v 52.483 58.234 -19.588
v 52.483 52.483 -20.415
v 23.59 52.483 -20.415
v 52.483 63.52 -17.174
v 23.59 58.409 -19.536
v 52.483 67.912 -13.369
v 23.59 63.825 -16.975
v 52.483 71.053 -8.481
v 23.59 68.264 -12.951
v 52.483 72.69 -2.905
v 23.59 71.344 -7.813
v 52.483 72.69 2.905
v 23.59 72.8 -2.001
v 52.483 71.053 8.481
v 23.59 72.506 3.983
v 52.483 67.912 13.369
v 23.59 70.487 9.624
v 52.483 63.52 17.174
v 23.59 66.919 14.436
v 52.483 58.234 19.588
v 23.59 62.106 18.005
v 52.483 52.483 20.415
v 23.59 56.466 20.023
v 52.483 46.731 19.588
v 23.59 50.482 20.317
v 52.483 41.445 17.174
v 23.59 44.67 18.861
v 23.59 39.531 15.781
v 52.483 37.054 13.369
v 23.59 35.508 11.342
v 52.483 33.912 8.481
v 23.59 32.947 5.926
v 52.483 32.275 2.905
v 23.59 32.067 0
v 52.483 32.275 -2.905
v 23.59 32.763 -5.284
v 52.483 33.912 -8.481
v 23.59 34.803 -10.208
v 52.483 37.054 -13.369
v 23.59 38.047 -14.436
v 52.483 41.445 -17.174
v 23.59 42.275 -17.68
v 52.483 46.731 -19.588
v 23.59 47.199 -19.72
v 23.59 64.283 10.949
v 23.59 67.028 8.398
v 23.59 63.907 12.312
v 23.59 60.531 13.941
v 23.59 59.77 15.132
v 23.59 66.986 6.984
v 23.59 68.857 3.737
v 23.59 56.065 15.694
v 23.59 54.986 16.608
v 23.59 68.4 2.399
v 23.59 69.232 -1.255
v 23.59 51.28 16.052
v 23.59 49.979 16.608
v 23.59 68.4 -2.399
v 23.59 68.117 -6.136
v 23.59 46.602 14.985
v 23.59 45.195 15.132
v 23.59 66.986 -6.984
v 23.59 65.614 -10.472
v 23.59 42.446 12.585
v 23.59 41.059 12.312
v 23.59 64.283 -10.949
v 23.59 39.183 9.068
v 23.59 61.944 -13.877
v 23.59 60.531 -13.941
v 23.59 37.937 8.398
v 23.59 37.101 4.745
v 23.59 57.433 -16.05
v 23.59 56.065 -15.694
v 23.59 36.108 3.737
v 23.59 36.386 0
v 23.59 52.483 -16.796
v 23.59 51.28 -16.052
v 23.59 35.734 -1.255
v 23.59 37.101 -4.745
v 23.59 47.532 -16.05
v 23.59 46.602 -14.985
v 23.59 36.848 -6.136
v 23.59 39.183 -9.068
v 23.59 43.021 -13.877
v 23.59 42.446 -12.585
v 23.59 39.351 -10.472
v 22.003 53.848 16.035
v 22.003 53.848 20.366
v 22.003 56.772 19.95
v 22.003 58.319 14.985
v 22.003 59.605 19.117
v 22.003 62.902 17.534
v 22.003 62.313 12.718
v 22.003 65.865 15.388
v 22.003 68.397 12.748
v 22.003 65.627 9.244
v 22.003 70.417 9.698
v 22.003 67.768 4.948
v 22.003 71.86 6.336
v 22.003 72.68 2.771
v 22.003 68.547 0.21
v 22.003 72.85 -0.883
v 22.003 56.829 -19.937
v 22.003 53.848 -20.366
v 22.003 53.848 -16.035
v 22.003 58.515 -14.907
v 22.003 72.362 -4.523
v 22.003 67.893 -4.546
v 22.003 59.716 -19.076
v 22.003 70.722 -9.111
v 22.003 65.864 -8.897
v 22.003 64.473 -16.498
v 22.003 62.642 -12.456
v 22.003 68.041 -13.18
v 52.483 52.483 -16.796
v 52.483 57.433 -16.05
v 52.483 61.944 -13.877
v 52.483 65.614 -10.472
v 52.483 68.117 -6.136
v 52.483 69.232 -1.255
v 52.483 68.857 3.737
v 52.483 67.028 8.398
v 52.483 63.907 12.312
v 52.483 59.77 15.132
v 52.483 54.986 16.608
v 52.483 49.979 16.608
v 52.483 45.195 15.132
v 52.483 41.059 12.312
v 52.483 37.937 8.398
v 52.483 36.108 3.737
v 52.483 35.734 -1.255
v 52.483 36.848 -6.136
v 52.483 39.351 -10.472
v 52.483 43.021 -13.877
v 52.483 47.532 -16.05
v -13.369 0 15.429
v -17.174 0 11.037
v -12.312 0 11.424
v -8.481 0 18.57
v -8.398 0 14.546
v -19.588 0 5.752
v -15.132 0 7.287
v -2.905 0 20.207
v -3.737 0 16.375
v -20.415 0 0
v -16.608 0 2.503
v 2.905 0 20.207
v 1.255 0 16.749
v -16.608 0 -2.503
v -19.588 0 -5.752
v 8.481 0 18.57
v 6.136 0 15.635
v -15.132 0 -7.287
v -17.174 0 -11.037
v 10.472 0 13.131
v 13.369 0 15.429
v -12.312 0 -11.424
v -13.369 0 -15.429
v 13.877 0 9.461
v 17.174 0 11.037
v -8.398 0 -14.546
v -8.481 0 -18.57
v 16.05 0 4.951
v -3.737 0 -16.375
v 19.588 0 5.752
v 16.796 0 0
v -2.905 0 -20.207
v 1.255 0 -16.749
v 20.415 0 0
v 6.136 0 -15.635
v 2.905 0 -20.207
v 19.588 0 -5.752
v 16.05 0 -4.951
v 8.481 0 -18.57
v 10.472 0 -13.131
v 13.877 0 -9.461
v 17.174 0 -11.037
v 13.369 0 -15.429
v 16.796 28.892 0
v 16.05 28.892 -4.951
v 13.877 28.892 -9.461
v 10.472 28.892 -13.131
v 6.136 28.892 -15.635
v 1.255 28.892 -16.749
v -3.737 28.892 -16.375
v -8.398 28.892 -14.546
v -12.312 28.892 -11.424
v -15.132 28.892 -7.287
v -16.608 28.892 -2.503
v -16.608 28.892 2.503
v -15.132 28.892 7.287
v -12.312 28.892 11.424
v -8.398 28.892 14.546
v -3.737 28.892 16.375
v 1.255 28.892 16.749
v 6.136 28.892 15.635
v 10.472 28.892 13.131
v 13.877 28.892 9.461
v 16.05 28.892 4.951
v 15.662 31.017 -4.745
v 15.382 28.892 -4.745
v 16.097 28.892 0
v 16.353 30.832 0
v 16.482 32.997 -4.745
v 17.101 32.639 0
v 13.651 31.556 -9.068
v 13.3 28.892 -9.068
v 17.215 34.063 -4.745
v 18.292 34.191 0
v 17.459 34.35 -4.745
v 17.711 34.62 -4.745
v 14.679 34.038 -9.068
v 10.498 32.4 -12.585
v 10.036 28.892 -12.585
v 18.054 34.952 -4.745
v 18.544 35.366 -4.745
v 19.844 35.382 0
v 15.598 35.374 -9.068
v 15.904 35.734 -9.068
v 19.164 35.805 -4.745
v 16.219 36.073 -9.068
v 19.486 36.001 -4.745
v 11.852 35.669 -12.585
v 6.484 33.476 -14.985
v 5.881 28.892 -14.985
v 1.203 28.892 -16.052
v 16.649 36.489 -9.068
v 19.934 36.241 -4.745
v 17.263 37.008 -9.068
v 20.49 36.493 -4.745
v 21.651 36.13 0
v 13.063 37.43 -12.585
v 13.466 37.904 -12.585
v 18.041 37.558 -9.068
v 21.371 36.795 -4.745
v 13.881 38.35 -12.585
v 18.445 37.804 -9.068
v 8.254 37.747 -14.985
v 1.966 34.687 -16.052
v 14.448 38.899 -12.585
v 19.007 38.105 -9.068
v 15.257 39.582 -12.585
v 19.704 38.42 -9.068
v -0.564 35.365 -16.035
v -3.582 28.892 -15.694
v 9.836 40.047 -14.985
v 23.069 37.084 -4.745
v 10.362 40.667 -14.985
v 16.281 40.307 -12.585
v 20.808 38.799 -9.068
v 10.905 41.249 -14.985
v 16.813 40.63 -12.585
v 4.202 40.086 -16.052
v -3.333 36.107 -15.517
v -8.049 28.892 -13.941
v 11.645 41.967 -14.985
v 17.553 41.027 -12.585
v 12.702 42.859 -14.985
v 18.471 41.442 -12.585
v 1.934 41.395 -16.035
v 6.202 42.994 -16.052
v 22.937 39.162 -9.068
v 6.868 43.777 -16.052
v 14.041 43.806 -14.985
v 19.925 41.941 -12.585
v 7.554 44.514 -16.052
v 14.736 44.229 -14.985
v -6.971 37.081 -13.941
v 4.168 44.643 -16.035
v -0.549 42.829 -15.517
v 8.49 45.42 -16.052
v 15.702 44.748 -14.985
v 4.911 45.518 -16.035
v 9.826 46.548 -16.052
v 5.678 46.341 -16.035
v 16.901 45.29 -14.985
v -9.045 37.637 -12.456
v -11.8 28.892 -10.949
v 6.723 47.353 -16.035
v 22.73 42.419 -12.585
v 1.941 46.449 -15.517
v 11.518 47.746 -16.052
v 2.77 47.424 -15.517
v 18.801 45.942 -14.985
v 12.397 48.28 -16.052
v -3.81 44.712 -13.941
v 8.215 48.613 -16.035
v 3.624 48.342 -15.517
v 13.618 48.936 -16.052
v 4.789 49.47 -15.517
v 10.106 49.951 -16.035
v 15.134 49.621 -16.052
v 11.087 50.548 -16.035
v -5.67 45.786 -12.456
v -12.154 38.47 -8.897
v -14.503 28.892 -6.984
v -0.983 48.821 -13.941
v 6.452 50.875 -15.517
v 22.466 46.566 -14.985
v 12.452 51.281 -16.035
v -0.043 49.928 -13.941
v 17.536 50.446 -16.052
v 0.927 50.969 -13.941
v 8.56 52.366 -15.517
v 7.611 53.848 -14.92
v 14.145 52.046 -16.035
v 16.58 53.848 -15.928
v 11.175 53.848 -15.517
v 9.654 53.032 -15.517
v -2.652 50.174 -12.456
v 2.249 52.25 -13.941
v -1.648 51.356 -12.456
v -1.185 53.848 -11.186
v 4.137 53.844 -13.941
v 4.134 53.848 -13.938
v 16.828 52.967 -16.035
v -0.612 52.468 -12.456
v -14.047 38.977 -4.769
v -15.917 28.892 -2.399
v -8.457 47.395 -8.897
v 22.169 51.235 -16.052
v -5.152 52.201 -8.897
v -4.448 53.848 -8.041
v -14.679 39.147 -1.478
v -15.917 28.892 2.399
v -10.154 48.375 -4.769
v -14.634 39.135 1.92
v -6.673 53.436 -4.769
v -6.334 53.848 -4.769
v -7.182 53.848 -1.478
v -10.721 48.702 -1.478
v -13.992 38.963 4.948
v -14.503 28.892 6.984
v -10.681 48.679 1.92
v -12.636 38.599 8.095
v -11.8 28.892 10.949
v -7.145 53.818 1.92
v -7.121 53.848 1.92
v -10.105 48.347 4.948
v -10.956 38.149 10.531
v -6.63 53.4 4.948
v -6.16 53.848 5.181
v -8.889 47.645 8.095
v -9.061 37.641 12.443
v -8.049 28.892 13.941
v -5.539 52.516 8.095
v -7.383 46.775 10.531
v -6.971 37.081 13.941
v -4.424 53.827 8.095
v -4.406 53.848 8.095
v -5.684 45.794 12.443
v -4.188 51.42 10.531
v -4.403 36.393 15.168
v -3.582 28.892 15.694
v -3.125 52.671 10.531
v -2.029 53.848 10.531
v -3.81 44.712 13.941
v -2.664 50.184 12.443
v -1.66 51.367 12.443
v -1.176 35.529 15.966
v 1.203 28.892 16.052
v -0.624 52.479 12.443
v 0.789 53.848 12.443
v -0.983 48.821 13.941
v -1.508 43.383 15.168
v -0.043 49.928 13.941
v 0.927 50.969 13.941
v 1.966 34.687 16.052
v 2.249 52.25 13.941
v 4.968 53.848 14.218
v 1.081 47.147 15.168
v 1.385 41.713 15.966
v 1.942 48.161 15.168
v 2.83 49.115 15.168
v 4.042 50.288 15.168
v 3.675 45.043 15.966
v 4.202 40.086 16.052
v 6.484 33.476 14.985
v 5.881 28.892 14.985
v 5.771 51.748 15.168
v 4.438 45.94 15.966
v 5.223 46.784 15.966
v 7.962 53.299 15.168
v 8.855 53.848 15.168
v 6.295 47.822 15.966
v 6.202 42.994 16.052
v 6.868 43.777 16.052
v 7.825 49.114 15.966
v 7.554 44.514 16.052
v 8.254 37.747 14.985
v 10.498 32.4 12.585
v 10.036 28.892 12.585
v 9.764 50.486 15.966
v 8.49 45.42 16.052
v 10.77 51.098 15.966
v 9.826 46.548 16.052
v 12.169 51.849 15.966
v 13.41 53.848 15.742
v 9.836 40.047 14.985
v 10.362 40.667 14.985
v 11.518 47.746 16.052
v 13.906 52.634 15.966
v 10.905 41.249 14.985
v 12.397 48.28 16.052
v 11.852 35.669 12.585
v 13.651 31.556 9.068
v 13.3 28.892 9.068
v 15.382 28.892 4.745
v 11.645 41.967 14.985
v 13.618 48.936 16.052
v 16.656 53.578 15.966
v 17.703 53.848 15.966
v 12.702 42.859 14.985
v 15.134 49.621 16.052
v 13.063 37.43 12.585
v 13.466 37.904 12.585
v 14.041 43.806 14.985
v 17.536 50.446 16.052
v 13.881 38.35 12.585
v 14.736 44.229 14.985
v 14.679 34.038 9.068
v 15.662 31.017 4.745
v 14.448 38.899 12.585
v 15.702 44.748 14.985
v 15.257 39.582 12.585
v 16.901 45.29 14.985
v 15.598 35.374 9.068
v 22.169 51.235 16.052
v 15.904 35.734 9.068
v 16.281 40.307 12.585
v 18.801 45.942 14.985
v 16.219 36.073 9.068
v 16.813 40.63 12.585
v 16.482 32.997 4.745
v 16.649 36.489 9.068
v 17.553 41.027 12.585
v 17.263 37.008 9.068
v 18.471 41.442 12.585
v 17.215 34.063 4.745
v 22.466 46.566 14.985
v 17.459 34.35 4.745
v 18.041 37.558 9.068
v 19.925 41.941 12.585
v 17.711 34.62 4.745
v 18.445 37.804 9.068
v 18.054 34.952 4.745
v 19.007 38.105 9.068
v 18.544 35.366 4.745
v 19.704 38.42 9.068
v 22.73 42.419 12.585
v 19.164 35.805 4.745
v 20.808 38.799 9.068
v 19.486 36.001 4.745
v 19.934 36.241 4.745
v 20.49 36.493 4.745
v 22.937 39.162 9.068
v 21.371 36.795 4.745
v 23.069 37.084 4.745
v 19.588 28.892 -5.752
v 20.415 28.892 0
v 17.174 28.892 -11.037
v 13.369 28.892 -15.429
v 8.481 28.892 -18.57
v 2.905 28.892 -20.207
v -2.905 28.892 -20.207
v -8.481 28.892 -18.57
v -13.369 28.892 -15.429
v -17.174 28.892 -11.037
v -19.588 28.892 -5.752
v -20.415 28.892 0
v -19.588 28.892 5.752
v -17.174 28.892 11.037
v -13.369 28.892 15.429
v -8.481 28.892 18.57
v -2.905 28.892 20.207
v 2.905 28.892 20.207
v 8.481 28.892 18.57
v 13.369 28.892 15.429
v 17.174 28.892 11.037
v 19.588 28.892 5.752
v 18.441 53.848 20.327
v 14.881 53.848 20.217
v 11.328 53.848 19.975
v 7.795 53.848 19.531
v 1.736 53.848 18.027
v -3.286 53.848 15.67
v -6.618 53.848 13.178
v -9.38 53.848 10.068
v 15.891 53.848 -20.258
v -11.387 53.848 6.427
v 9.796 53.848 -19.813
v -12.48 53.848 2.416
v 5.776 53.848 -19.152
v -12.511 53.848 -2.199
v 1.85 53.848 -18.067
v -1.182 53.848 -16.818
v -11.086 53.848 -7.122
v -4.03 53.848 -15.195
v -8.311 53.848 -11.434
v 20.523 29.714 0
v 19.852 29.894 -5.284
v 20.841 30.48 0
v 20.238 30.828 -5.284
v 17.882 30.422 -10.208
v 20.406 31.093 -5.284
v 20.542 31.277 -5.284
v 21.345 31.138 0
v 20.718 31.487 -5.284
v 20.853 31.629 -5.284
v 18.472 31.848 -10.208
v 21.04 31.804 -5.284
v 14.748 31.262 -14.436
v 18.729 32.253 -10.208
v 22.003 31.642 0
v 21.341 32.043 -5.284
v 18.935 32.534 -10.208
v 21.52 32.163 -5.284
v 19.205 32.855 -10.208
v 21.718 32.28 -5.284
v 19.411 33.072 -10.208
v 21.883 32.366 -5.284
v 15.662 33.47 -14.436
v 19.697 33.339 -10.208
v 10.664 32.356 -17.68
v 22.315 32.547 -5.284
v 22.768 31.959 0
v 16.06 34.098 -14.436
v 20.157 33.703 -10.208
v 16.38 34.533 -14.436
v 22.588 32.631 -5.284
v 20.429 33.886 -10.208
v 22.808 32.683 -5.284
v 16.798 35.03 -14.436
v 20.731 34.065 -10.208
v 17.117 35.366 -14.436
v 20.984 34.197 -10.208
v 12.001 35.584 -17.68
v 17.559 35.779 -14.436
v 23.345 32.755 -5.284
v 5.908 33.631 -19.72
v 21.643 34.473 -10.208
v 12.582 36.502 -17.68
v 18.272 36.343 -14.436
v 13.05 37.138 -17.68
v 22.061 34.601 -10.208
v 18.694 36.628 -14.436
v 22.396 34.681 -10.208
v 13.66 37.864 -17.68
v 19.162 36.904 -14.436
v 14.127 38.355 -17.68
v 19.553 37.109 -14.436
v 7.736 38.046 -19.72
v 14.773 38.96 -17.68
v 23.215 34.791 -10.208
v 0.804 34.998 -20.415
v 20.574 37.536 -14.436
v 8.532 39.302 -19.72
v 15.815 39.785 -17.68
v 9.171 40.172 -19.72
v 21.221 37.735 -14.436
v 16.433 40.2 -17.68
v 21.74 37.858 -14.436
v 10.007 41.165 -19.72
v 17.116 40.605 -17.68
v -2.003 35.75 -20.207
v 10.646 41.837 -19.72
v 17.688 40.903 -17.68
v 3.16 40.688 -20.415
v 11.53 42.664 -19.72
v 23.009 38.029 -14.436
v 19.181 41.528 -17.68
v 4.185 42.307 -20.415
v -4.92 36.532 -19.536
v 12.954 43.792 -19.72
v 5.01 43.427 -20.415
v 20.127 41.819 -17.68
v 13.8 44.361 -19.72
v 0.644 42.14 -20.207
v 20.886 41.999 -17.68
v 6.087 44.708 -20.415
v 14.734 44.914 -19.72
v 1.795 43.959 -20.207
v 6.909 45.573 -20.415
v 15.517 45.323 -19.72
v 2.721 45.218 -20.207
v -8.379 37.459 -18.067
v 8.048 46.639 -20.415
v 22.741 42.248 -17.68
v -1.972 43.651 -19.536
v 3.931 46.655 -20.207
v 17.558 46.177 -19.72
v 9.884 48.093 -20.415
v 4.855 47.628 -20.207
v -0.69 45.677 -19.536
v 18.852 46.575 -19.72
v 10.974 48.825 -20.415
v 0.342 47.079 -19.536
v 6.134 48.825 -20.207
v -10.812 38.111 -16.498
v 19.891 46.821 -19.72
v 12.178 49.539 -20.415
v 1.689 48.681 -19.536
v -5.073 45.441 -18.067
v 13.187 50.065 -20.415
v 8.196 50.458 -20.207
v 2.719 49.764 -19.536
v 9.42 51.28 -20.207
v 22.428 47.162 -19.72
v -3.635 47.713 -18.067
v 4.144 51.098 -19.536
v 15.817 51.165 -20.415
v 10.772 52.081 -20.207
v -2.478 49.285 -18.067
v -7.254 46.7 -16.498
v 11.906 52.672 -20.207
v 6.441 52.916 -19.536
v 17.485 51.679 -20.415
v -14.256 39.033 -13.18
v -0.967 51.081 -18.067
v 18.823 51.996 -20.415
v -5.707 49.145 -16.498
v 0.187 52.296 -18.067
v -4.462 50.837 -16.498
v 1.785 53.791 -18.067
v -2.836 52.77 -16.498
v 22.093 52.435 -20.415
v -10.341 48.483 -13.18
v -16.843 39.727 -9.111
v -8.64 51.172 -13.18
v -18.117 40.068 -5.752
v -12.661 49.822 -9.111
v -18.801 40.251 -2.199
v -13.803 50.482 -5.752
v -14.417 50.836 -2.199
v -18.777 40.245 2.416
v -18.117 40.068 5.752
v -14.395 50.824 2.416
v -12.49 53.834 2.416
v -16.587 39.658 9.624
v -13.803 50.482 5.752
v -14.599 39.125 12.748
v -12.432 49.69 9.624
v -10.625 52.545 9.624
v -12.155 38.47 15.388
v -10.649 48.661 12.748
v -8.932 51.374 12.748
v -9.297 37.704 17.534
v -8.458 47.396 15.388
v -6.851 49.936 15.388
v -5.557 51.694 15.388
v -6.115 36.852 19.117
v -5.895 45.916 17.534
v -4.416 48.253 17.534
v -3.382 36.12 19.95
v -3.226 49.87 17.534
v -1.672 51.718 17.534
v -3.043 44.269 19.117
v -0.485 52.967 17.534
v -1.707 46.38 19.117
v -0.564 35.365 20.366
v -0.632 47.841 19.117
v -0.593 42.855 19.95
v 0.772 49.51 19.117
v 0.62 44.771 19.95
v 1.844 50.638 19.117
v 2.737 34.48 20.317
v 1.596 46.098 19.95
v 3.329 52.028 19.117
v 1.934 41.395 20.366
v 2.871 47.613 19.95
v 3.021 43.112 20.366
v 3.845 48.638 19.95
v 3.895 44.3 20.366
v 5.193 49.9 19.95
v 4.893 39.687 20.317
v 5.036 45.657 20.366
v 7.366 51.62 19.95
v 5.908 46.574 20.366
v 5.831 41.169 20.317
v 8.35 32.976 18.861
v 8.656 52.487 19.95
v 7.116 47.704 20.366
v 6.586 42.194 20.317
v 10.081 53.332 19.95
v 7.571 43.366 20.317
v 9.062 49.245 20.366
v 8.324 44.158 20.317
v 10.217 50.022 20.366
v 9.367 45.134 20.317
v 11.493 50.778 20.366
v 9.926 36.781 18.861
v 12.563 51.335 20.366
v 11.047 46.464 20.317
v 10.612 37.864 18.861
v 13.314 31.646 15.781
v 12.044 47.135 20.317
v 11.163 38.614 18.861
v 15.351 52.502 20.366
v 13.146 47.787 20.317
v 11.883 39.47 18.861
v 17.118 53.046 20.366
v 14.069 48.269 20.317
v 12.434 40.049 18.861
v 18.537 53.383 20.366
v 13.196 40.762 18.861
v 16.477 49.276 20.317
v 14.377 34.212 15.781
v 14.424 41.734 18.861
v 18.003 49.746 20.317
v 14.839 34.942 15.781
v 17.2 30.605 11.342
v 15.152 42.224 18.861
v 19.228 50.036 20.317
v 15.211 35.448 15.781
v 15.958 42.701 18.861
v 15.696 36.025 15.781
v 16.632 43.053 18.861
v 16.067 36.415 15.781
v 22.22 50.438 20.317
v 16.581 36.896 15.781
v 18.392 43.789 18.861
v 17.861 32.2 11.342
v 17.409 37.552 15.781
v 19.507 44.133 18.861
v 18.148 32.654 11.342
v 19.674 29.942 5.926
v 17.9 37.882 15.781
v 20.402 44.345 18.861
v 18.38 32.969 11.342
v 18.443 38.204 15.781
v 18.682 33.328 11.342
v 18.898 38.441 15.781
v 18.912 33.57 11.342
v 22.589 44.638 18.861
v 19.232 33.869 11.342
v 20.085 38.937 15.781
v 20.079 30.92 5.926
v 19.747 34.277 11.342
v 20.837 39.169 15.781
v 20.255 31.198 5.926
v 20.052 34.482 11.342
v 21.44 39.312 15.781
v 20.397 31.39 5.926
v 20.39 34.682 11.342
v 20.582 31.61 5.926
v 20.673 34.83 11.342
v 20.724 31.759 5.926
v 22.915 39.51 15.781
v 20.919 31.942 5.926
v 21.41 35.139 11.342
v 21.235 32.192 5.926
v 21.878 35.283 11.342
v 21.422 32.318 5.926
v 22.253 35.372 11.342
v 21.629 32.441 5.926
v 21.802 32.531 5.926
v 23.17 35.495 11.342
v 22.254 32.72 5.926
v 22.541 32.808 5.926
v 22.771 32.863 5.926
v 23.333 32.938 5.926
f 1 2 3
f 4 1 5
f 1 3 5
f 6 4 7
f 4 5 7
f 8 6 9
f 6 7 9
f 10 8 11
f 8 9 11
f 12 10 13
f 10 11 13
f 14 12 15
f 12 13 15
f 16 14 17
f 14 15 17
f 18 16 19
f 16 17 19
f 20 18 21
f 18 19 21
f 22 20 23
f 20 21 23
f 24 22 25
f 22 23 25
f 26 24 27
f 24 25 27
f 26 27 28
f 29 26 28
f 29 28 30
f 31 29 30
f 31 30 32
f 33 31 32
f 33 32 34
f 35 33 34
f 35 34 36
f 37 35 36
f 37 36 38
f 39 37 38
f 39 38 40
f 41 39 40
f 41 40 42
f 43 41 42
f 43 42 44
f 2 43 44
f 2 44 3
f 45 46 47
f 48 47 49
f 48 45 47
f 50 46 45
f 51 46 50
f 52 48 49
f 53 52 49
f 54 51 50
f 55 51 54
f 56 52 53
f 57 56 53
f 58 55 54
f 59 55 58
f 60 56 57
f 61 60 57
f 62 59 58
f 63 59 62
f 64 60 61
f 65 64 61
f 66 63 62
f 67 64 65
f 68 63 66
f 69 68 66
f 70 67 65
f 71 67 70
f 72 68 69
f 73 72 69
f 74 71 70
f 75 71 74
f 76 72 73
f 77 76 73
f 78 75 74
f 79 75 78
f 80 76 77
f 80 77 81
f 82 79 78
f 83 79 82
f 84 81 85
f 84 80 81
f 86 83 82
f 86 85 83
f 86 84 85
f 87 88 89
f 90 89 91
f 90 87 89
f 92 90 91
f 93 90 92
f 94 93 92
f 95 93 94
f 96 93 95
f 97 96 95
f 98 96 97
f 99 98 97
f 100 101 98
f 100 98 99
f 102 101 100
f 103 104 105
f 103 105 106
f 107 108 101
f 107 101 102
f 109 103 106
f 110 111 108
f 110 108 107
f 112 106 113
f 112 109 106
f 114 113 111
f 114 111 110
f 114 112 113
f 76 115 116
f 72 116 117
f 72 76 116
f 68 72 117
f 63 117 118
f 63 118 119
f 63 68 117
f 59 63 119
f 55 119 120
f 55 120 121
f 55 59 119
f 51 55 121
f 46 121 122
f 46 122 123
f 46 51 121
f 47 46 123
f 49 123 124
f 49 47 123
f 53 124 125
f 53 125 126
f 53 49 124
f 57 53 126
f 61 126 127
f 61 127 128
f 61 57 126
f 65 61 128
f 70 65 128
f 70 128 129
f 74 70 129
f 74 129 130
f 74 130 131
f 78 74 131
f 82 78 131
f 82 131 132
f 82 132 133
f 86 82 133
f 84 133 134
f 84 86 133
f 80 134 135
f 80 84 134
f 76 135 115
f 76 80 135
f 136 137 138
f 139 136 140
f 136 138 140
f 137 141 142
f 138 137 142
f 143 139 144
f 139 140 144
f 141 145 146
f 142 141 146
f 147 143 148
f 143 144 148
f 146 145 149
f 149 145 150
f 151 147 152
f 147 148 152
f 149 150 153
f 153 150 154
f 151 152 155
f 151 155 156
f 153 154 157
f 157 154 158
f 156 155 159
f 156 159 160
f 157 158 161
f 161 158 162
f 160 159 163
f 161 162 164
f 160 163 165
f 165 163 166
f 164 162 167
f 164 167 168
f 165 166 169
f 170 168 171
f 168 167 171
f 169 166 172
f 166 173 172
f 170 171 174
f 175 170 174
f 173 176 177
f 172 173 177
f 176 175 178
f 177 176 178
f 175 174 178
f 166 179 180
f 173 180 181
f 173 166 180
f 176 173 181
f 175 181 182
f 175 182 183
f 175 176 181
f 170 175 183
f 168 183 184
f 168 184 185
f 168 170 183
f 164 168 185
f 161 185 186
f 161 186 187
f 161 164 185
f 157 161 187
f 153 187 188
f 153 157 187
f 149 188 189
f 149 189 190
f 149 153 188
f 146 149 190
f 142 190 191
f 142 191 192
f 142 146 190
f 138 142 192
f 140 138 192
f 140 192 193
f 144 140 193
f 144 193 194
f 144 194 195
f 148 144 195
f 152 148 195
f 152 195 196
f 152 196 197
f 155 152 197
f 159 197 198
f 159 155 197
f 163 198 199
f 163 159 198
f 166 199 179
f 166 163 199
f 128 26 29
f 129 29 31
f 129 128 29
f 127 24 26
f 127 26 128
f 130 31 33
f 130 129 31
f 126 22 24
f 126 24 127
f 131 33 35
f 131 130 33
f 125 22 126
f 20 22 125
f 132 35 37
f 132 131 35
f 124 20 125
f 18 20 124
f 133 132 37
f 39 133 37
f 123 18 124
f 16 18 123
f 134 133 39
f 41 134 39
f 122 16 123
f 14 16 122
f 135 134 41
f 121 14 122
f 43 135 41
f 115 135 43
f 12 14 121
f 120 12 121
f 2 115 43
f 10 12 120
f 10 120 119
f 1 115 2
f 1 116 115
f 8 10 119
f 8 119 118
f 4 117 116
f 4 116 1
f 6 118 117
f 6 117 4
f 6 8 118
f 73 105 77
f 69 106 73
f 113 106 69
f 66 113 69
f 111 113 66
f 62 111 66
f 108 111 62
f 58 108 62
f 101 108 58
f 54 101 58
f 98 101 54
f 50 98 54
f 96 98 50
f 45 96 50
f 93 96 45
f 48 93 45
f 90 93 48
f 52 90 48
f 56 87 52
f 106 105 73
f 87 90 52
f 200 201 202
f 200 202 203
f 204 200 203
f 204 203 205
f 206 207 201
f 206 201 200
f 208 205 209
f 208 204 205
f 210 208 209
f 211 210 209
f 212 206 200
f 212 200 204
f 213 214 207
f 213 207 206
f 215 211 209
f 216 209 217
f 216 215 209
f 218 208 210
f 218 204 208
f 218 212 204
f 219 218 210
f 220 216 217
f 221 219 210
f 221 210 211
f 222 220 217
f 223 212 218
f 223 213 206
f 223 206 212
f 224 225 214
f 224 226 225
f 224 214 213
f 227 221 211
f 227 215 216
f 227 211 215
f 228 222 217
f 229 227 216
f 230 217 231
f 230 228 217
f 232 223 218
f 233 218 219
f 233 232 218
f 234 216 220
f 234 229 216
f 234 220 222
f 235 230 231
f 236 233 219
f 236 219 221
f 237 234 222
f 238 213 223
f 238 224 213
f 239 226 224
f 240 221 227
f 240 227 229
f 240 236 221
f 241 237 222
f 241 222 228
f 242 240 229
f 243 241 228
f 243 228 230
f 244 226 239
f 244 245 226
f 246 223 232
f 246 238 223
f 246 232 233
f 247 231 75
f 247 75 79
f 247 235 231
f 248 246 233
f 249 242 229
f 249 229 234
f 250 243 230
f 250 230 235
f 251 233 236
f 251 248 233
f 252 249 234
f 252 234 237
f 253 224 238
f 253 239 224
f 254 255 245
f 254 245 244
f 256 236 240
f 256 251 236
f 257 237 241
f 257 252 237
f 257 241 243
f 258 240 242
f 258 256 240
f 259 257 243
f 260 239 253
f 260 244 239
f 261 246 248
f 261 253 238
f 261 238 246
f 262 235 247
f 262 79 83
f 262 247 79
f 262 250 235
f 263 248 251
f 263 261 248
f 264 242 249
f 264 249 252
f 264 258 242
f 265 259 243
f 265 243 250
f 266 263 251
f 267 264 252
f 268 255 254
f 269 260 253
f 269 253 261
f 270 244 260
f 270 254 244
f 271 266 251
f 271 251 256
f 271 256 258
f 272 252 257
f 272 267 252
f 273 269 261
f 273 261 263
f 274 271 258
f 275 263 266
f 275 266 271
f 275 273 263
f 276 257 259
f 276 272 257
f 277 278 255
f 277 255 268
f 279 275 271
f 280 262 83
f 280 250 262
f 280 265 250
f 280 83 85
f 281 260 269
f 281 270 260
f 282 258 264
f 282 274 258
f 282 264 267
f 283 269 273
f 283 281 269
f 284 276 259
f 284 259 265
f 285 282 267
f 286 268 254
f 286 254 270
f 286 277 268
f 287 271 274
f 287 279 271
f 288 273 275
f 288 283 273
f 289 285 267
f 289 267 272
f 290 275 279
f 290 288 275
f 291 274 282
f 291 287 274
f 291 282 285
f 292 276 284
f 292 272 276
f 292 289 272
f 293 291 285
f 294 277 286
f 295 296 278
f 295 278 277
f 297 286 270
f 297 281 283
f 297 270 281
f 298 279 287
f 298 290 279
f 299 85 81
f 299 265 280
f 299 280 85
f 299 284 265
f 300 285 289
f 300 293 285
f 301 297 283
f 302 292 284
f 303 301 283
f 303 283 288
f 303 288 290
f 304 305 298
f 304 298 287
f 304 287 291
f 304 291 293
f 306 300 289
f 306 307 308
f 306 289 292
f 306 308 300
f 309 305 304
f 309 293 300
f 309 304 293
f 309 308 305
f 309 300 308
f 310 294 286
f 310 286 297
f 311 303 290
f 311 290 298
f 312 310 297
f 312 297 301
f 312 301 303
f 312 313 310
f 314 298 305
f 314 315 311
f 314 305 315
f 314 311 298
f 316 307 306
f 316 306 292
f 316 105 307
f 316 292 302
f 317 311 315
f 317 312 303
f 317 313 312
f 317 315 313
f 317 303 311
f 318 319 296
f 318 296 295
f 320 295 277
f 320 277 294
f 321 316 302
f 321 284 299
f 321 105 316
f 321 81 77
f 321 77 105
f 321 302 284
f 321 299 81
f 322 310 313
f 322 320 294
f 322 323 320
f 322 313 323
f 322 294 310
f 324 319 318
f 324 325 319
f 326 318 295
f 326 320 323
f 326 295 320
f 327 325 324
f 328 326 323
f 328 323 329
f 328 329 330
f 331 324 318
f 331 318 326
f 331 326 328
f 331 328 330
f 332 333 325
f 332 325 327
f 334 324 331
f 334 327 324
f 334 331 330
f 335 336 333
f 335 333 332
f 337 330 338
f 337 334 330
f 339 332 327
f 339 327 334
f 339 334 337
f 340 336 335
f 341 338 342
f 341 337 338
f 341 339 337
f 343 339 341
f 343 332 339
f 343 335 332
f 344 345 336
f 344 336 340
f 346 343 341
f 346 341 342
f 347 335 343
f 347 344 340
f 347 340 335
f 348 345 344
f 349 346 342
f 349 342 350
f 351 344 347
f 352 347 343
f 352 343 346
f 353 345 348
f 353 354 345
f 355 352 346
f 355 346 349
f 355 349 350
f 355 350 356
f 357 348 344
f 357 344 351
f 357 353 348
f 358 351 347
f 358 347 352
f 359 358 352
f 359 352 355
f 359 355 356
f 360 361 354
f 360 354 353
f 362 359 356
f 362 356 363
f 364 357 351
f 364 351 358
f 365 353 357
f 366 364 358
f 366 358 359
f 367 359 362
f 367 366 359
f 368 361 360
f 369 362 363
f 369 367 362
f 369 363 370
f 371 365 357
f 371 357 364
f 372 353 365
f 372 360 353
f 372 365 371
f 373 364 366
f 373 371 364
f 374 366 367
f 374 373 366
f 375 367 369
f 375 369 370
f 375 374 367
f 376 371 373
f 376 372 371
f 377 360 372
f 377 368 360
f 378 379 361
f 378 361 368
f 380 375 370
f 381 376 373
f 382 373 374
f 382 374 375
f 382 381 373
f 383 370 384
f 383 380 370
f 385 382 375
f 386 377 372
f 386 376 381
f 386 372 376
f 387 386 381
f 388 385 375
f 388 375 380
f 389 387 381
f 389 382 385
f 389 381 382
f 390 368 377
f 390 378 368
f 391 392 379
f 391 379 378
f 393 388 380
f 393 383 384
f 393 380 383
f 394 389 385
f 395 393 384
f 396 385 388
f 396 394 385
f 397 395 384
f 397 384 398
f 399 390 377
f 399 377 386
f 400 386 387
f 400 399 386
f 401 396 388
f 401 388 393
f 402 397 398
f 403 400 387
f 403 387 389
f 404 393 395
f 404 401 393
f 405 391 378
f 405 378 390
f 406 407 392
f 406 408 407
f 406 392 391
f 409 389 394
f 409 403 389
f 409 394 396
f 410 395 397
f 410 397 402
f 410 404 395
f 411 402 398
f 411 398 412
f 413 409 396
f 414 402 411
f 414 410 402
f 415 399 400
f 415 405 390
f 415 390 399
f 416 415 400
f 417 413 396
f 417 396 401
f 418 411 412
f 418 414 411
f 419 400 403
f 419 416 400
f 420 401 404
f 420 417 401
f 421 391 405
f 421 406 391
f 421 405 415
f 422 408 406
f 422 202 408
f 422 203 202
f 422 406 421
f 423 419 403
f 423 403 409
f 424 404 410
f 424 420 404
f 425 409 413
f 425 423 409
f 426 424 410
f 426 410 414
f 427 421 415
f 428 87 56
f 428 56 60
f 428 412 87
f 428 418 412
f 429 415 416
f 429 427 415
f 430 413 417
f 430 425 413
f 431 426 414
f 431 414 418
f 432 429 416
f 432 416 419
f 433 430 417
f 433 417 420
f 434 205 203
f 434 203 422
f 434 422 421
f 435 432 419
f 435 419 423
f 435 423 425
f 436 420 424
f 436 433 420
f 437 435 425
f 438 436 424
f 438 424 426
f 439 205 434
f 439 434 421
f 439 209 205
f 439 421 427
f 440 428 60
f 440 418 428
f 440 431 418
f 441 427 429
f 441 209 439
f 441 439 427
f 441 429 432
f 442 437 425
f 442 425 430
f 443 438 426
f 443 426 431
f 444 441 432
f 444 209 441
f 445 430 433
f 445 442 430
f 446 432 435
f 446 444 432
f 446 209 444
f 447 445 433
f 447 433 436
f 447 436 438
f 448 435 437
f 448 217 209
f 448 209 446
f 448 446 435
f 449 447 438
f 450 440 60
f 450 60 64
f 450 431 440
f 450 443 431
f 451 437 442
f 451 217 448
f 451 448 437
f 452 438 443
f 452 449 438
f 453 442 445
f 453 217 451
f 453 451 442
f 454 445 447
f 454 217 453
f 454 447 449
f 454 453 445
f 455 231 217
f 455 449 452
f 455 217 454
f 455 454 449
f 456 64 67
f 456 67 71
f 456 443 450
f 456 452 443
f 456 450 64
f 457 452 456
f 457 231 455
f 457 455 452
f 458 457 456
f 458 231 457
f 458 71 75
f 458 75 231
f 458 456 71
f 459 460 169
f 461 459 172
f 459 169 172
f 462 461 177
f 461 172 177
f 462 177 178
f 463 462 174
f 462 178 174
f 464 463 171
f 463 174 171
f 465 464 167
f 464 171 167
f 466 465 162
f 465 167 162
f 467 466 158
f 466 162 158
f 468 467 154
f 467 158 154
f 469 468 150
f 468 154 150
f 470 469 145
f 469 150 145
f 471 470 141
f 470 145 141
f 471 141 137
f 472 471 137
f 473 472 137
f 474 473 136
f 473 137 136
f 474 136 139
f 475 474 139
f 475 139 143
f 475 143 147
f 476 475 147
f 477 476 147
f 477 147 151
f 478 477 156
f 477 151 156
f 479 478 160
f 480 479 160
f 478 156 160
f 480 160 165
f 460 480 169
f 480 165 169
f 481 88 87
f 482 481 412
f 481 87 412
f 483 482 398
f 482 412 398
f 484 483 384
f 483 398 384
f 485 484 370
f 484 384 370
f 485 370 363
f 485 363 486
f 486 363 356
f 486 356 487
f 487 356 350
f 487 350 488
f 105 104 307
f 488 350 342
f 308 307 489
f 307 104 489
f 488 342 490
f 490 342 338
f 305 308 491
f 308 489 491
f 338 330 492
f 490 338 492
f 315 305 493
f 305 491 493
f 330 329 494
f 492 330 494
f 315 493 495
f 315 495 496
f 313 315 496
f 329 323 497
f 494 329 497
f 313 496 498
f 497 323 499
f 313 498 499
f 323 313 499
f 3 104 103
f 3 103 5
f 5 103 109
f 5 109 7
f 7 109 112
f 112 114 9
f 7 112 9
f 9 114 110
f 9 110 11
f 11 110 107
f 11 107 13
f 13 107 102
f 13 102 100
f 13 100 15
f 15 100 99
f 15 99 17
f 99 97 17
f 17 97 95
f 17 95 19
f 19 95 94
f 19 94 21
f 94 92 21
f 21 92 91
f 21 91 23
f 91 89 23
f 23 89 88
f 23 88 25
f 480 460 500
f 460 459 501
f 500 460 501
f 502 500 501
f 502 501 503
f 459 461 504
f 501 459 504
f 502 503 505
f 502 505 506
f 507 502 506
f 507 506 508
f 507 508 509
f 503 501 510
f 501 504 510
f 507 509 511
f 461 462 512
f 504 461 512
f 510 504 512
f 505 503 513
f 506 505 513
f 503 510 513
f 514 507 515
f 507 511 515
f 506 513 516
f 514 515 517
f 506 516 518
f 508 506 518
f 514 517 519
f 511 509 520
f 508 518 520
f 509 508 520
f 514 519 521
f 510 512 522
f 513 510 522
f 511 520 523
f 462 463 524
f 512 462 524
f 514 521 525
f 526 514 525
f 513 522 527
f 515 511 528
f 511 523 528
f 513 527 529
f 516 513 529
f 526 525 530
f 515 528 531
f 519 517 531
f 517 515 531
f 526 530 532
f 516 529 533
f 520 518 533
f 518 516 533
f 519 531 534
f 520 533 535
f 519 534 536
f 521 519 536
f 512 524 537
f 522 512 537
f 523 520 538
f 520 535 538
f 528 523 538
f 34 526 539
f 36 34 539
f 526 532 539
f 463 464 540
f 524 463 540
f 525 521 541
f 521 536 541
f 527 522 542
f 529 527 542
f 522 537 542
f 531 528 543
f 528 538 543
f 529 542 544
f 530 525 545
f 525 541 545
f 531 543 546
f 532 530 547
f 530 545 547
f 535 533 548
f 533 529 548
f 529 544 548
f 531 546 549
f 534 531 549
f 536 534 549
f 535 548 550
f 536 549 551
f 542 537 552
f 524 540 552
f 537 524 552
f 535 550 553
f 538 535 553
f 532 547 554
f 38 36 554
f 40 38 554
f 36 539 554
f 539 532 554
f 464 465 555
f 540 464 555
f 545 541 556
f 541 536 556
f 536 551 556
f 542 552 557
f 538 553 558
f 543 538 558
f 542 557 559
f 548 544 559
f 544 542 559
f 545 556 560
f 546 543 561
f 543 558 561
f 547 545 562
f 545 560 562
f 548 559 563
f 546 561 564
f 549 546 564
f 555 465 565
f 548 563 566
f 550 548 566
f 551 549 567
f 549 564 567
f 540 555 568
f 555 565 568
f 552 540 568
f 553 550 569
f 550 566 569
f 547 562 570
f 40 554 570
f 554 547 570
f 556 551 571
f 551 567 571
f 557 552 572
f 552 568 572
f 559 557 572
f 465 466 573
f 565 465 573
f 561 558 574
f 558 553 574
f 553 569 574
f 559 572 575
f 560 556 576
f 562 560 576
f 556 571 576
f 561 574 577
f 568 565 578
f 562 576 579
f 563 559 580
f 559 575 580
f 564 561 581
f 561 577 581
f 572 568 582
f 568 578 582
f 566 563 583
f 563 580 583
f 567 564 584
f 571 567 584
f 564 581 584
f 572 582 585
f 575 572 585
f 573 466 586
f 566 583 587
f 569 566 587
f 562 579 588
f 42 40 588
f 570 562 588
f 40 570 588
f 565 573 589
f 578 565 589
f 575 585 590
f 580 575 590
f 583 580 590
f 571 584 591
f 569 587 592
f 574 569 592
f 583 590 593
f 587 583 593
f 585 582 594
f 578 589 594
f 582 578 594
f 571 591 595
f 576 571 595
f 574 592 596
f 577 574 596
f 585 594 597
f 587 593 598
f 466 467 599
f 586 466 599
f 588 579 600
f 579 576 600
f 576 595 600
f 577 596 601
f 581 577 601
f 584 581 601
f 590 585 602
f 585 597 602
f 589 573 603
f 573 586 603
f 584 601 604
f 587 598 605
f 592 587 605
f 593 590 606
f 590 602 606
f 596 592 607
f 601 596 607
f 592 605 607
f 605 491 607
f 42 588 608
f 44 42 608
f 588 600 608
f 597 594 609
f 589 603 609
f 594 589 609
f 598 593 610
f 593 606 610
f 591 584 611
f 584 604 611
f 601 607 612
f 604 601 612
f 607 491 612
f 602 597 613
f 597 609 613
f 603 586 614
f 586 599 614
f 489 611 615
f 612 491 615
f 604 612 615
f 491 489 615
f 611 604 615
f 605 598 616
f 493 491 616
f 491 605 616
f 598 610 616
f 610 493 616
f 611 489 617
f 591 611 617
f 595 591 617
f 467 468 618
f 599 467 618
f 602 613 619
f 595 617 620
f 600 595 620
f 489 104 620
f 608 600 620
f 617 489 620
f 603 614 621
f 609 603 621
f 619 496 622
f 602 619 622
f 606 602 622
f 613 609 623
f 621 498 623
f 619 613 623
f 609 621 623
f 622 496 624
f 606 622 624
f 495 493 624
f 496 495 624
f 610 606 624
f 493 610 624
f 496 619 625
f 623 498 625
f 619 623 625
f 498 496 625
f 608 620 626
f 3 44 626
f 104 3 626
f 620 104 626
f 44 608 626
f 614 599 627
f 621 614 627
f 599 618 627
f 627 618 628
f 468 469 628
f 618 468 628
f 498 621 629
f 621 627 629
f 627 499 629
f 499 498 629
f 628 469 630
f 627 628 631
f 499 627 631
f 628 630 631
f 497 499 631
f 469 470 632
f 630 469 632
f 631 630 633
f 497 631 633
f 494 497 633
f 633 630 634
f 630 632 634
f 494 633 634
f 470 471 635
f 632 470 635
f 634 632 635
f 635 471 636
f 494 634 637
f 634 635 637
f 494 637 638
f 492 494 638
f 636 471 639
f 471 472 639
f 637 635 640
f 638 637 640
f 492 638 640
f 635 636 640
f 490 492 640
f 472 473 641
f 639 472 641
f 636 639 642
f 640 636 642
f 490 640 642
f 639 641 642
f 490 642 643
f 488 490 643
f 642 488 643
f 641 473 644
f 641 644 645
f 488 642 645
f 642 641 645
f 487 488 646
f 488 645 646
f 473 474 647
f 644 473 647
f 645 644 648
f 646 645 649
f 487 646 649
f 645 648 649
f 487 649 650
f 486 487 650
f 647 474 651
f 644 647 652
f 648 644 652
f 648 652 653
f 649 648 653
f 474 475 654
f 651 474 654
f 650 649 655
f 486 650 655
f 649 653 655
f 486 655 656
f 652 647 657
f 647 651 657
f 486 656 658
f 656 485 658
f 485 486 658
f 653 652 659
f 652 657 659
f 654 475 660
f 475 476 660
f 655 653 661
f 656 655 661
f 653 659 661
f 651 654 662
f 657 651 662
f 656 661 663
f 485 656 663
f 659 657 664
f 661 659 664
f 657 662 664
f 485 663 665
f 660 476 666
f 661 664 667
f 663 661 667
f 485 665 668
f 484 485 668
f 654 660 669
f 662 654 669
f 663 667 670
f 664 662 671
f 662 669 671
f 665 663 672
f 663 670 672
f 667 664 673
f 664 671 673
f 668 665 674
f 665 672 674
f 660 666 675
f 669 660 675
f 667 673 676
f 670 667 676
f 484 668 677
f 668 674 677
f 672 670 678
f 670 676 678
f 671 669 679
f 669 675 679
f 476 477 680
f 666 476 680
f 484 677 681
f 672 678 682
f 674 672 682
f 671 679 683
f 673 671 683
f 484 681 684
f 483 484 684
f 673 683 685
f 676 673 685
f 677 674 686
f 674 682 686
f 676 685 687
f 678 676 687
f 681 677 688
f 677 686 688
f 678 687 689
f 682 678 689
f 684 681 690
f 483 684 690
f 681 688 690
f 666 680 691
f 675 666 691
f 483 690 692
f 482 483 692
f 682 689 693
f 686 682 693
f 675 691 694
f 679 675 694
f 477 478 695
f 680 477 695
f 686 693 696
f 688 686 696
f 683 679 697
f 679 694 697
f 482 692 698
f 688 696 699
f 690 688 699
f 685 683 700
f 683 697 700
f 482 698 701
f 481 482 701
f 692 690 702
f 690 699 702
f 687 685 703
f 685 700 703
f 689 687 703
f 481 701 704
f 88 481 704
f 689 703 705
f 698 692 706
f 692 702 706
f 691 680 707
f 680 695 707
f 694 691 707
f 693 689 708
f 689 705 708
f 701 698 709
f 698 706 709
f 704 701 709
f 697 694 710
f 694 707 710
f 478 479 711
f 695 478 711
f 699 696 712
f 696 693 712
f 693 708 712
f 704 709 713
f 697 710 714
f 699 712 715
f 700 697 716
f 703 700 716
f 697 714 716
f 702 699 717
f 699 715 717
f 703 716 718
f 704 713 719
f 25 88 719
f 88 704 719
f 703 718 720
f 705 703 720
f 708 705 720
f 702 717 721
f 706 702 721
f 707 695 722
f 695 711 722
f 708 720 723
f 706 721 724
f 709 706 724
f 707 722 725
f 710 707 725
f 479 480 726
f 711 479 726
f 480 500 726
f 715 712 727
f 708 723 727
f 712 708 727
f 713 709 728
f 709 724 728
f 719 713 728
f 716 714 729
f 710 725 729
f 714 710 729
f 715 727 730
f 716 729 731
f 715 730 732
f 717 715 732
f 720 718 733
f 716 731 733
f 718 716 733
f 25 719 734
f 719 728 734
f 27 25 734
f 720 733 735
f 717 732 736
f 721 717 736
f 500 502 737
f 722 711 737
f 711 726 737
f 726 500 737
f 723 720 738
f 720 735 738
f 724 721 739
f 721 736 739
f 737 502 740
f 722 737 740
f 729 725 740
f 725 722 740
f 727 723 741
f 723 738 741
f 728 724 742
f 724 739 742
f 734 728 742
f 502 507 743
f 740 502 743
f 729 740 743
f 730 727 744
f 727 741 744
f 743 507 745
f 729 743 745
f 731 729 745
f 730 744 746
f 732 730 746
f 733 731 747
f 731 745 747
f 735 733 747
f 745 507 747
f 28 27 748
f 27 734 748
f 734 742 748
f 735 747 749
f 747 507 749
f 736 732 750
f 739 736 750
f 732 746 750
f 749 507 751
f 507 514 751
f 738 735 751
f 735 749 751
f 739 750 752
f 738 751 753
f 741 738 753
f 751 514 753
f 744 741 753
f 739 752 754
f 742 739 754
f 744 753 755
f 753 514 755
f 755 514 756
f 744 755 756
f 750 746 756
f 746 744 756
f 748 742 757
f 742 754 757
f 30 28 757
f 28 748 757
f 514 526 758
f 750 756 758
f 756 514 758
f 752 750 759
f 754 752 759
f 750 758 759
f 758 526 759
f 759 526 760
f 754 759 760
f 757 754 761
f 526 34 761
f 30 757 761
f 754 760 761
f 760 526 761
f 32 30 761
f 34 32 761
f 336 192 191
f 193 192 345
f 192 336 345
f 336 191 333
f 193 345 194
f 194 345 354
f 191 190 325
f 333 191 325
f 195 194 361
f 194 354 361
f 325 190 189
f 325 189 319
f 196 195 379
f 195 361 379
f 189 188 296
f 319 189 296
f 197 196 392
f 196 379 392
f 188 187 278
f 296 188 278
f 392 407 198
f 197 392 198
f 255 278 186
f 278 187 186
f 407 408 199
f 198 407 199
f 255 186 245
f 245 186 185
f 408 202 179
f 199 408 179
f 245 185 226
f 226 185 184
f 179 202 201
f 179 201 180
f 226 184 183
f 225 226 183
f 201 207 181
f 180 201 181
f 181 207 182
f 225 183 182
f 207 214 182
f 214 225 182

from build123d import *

# Parameters (mm, degrees)
SKETCH1_R           = 20.41525
SKETCH1_R_2         = 16.79575
BOSS_EXTRUDE1_DEPTH = 28.8925
SKETCH2_R           = 20.41525
SKETCH2_R_2         = 16.09725
REVOLVE1_ANGLE      = 90
SKETCH3_R           = 20.41525
SKETCH3_R_2         = 16.79575
BOSS_EXTRUDE2_DEPTH = 28.8925
SKETCH5_W           = 42.418
SKETCH5_H           = 19.05
CUT_EXTRUDE2_DEPTH  = 66.9925


with BuildPart() as part:
    # Sketch1 → Boss-Extrude1 (new body)
    with BuildSketch(Plane(origin=(0, 0, 0), x_dir=(1, 0, 0), z_dir=(0, 1, 0))):
        Circle(SKETCH1_R)
        Circle(SKETCH1_R_2, mode=Mode.SUBTRACT)
    extrude(amount=BOSS_EXTRUDE1_DEPTH)

    # Sketch2 → Revolve1 (revolve)
    with BuildSketch(Plane(origin=(0, 28.8925, 0), x_dir=(1, 0, 0), z_dir=(0, 1, 0))):
        Circle(SKETCH2_R)
        Circle(SKETCH2_R_2, mode=Mode.SUBTRACT)
    revolve(axis=Axis((23.59025, 28.8925, 20.41525), (0, 0, -1)), revolution_arc=REVOLVE1_ANGLE)

    # Sketch3 → Boss-Extrude2 (add)
    with BuildSketch(Plane(origin=(23.59025, 0, 0), x_dir=(0, 0, -1), z_dir=(1, 0, 0))):
        with Locations((0, 52.48275)):
            Circle(SKETCH3_R)
        with Locations((0, 52.48275)):
            Circle(SKETCH3_R_2, mode=Mode.SUBTRACT)
    extrude(amount=BOSS_EXTRUDE2_DEPTH)

    # Sketch5 → Cut-Extrude2 (cut)
    with BuildSketch(Plane(origin=(0, 28.8925, -20.41525), x_dir=(-1, 0, 0), z_dir=(0, 0, -1))):
        with Locations((-0.79375, 34.4805)):
            Rectangle(SKETCH5_W, SKETCH5_H)
    extrude(amount=-CUT_EXTRUDE2_DEPTH, mode=Mode.SUBTRACT)


solid = part.part
